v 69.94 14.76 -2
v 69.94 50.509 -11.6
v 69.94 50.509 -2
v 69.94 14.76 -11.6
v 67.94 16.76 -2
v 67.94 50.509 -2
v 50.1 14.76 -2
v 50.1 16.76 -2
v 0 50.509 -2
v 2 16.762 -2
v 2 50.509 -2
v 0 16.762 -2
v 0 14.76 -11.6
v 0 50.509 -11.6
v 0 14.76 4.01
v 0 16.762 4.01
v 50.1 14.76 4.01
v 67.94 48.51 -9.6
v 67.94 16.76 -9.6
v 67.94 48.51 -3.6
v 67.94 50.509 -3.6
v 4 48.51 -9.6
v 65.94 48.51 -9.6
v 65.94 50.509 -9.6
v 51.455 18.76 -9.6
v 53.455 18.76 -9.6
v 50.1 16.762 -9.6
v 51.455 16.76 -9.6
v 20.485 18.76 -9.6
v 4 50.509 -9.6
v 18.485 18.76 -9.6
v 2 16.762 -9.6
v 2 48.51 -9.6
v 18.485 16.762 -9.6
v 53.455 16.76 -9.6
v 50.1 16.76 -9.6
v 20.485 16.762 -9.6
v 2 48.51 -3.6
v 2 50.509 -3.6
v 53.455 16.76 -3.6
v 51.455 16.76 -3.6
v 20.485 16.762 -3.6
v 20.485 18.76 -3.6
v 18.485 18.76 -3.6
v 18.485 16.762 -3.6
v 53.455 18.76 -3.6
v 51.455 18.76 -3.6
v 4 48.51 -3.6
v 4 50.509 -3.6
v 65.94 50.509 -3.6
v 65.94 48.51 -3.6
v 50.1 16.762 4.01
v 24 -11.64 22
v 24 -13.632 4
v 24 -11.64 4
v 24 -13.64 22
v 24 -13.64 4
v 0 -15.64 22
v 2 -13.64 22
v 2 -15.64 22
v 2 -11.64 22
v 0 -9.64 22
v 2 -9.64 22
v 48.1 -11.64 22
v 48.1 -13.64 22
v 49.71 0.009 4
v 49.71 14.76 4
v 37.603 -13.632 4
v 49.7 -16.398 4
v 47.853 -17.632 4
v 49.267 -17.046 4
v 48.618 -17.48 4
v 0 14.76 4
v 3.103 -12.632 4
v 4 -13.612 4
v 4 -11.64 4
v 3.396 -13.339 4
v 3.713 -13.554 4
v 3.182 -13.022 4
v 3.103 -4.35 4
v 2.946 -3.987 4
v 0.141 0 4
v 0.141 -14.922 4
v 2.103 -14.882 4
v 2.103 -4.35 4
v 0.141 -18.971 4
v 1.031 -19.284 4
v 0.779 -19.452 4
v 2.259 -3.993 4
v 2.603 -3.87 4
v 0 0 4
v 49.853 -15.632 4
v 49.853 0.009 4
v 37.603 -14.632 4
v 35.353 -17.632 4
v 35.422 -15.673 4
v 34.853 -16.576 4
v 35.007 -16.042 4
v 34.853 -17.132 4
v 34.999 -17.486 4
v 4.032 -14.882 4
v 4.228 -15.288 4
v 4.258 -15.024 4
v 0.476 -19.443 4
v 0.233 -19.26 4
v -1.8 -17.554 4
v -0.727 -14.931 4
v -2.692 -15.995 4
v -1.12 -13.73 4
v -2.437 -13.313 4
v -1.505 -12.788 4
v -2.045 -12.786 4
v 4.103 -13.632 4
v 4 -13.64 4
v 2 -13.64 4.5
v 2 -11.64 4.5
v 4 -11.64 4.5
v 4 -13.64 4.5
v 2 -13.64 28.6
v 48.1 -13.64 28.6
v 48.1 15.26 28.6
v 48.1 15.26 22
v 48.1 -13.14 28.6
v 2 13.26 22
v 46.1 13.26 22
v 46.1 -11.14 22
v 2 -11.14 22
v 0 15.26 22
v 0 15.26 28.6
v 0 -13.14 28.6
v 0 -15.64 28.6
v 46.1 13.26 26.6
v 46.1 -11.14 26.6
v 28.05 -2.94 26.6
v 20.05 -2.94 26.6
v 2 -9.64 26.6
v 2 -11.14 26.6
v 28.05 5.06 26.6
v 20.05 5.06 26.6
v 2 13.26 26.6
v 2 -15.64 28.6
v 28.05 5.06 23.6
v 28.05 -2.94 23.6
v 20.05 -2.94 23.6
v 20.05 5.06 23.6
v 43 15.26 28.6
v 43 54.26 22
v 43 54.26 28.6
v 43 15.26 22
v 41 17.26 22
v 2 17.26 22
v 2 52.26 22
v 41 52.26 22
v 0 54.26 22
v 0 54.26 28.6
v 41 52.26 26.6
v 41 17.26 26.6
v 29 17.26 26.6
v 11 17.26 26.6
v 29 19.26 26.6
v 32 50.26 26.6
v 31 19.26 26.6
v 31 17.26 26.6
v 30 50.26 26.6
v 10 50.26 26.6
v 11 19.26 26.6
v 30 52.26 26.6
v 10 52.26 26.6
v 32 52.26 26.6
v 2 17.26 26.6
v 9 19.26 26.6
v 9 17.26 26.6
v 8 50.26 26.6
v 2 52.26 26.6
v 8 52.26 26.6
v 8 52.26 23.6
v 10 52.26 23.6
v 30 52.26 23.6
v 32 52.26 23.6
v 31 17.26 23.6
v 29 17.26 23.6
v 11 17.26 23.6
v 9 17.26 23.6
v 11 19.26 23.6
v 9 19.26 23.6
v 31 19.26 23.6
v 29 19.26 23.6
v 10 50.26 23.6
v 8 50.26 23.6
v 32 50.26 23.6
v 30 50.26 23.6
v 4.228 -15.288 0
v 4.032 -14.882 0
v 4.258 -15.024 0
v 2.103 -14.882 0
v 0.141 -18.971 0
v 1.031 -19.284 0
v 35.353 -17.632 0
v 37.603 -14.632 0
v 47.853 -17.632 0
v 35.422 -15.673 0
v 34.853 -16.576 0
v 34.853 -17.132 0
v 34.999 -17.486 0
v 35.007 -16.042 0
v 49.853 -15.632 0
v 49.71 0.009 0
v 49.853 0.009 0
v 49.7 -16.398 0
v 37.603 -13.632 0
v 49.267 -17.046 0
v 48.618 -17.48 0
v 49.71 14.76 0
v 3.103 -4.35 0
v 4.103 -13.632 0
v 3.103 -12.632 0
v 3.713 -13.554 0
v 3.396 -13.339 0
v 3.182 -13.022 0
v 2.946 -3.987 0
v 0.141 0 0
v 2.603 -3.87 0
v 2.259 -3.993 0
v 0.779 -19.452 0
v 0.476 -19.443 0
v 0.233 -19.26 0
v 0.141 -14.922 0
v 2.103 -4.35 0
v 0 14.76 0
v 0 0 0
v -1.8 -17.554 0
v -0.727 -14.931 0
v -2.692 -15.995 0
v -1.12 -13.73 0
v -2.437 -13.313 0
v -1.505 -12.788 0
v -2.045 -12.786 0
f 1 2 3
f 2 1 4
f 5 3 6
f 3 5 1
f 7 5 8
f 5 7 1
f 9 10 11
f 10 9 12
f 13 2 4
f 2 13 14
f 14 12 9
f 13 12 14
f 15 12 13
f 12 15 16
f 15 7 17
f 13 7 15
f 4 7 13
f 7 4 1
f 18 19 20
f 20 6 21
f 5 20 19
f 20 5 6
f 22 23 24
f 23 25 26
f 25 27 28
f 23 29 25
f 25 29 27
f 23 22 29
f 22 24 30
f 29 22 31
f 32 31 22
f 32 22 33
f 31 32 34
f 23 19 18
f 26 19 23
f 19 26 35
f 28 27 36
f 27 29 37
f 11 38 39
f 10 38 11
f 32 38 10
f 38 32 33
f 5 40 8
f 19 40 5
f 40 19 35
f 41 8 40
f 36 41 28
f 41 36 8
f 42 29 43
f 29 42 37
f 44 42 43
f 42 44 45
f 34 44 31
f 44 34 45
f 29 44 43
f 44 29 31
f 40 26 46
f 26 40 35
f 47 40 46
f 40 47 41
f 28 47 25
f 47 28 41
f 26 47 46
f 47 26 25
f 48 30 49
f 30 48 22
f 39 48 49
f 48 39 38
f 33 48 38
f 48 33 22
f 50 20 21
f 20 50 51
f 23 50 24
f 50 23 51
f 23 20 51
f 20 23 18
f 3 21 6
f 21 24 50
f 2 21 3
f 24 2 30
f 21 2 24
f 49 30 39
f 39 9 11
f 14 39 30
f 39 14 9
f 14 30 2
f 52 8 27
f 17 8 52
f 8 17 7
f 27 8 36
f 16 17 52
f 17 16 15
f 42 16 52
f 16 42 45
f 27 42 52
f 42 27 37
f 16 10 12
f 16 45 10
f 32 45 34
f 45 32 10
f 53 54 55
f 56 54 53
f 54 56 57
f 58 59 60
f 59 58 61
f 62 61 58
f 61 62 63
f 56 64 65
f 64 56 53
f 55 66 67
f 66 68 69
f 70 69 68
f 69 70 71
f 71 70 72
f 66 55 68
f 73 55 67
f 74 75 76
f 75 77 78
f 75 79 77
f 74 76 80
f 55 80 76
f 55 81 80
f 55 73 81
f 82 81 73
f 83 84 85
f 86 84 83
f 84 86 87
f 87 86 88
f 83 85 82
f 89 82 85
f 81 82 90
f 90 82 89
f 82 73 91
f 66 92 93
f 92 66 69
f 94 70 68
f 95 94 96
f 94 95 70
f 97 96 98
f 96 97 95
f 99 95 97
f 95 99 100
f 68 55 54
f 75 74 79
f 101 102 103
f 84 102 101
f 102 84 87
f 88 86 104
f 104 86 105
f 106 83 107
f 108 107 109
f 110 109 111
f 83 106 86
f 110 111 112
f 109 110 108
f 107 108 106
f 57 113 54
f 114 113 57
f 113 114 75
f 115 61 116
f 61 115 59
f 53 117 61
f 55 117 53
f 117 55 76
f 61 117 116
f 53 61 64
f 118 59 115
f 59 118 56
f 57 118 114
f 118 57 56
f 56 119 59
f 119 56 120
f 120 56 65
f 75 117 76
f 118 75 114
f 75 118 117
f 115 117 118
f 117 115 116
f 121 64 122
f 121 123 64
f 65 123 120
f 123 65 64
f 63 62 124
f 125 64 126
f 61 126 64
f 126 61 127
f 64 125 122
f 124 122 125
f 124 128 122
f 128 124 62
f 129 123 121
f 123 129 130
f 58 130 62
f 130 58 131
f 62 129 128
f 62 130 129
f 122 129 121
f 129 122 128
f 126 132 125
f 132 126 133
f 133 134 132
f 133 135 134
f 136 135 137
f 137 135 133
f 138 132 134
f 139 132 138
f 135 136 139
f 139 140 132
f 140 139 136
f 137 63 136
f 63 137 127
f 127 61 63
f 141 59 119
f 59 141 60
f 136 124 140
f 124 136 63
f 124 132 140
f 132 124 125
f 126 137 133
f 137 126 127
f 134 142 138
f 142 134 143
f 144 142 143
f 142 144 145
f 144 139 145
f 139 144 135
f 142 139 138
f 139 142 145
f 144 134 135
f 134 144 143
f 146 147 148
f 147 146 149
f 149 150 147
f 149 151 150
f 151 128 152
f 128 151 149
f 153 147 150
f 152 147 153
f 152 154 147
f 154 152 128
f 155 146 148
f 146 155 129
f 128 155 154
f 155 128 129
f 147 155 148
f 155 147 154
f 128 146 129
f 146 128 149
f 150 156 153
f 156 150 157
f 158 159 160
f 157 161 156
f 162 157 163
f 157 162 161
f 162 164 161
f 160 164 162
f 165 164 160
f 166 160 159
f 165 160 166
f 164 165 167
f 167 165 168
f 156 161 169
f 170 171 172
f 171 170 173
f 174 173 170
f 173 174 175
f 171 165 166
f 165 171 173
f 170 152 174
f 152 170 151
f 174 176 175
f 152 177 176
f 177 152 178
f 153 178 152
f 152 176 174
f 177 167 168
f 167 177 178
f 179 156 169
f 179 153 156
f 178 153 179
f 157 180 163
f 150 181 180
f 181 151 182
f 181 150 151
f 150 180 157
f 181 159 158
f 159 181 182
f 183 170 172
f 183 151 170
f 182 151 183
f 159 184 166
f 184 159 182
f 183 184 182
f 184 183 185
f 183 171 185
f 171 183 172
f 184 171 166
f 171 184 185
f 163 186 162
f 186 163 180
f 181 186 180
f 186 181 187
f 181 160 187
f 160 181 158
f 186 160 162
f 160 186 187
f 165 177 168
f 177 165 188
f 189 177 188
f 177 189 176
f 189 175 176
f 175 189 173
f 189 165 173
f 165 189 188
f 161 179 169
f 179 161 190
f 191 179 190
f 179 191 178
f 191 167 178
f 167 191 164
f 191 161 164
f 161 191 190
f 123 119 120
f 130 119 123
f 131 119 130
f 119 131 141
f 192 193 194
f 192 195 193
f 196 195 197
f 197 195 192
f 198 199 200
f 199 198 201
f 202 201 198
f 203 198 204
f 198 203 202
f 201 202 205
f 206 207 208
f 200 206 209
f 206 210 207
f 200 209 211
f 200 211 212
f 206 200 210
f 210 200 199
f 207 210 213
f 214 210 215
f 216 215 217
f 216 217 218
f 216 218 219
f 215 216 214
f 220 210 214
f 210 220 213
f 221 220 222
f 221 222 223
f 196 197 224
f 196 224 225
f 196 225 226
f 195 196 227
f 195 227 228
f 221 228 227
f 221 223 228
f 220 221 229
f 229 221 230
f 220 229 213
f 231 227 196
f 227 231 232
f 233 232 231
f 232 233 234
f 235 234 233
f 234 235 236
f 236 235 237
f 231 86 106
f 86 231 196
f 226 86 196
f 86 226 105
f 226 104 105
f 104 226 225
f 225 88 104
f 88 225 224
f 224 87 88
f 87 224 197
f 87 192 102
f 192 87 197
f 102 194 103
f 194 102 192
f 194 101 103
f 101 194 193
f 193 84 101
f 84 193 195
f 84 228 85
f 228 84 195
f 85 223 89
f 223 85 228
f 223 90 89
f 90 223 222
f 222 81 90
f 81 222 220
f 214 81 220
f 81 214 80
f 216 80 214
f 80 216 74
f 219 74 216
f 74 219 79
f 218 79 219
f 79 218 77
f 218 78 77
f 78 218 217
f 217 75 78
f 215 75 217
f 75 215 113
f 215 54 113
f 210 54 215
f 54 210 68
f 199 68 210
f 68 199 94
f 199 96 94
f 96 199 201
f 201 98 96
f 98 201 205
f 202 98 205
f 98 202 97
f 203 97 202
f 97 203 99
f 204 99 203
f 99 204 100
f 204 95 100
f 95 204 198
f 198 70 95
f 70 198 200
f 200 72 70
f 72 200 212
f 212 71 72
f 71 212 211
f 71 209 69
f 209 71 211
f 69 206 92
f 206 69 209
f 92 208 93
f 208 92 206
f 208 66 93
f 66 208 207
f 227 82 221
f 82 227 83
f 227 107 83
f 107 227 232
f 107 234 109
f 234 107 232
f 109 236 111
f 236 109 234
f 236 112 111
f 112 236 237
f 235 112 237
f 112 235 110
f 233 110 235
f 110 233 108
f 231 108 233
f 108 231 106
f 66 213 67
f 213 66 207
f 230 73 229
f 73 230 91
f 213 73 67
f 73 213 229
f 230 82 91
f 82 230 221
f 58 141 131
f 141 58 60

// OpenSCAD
// file: pcb-model-sizes.scad
pcbSmtLvSize=[65.94, 33.75];
pcbDevkitcRelaySize=[57.53, 31.88];
pcbCurrentSensorSize=[43.5, 35];
pcbCurrentSensorMiniSize=[39, 35];
pcbCurrentSensorMiniPadDepth=15;
pcbContactorPsuSize=[44.1, 24.4];
pcbContactorInterfaceRelaySize=[41.3,34.8];

pcbRelayHeight = 18.5;
pcbTallCompoent = 15;
pcbShortComponent = 6;

pcbThickness = 1.6;
solderThickness = 3;
wallThickness = 1.5;
partitionThickness = 0.8;

caseMargin = 0.2;
// file: bento-pcb-containers.scad
include <pcb-model-sizes.scad>

relayTopStands=[9, 42];
relayBottomStands = [12, 41];

module bentoRelay(wallThickness=[2,2,2], solderThickness=3, boardThickness=1.6, standSize = 2) {
    difference() {
        cube([wallThickness[0] * 2 + pcbDevkitcRelaySize[0], wallThickness[1] * 2 + pcbDevkitcRelaySize[1], wallThickness[2] + solderThickness + boardThickness]);
        translate([wallThickness[0], wallThickness[1], wallThickness[2]]) {
            cube([pcbDevkitcRelaySize[0], pcbDevkitcRelaySize[1], solderThickness + boardThickness + 0.01]);
        }
    }
    translate(wallThickness) {
        for(stand = relayBottomStands) {
            translate([stand, 0, 0]){
               cube([standSize, standSize, solderThickness]);
            }
        }
    }
    translate(wallThickness + [0, pcbDevkitcRelaySize[1] - standSize, 0]) {
        for(stand = relayTopStands) {
            translate([stand, 0, 0]){
               cube([standSize, standSize, solderThickness]);
            }
        }
    }
}

bentoRelay();


currentTopStands=[6, 28];
currentBottomStands = [7, 27];

module bentoCurrentSensor(wallThickness=[2,2,2], solderThickness=3, boardThickness=1.6, standSize = 2) {
    difference() {
        cube([wallThickness[0] * 2 + pcbCurrentSensorSize[0], wallThickness[1] * 2 + pcbCurrentSensorSize[1], wallThickness[2] + solderThickness + boardThickness]);
        translate([wallThickness[0], wallThickness[1], wallThickness[2]]) {
            cube([pcbCurrentSensorSize[0], pcbCurrentSensorSize[1], solderThickness + boardThickness + 0.01]);
        }
    }
    translate(wallThickness) {
        for(stand = currentBottomStands) {
            translate([stand, 0, 0]){
               cube([standSize, standSize, solderThickness]);
            }
        }
    }
    translate(wallThickness + [0, pcbCurrentSensorSize[1] - standSize, 0]) {
        for(stand = currentTopStands) {
            translate([stand, 0, 0]){
               cube([standSize, standSize, solderThickness]);
            }
        }
    }
}

translate([80, 0, 0]) {
    bentoCurrentSensor();
}


smtLvTopStands=[0, pcbSmtLvSize[0] - 2 ];
smtLvBottomStands=[pcbSmtLvSize[0]/4, pcbSmtLvSize[0] - pcbSmtLvSize[0]/4 ];

module bentoSmtLv(wallThickness=[2,2,2], solderThickness=3, boardThickness=1.6, standSize = 2, topWall=true) {
    difference() {
        cube([wallThickness[0] * (topWall ? 2 : 1) + pcbSmtLvSize[0], wallThickness[1] * 2 + pcbSmtLvSize[1], wallThickness[2] + solderThickness + boardThickness]);
        translate([wallThickness[0], wallThickness[1], wallThickness[2]]) {
            cube([pcbSmtLvSize[0], pcbSmtLvSize[1], solderThickness + boardThickness + 0.01]);
        }
    }
    translate(wallThickness) {
        for(stand = smtLvBottomStands) {
            translate([stand, 0, 0]){
               cube([standSize, standSize, solderThickness]);
            }
        }
    }
    translate(wallThickness + [0, pcbSmtLvSize[1] - standSize, 0]) {
        for(stand = smtLvTopStands) {
            translate([stand, 0, 0]){
               cube([standSize, standSize, solderThickness]);
            }
        }
    }
}

translate([140, 0, 0]) {
    bentoSmtLv();
}


echo(pcbContactorPsuSize[0]);

module bentoContactorPsu(wallThickness=[2,2,2], solderThickness=3, boardThickness=1.6, standSize = 2) {
    difference() {
        cube([wallThickness[0] * 2 + pcbContactorPsuSize[0], wallThickness[1] * 2 + pcbContactorPsuSize[1], wallThickness[2] + solderThickness + boardThickness]);
        translate([wallThickness[0], wallThickness[1], wallThickness[2]]) {
            cube([pcbContactorPsuSize[0], pcbContactorPsuSize[1], solderThickness + boardThickness + 0.01]);
        }
    }

    translate([wallThickness[0] + pcbContactorPsuSize[0] / 2 - 2 * standSize, wallThickness[1] + pcbContactorPsuSize[1] / 2 - 2 * standSize, wallThickness[2]]) {
        cube([4 * standSize, 4 * standSize, solderThickness]);
    }
}

translate([220, 0, 0]) {
    bentoContactorPsu();
}

currentMiniTopStands=[6, 28];
currentMiniBottomStands = [7, 27];

module bentoCurrentSensorMini(wallThickness=[2,2,2], solderThickness=3, boardThickness=1.6, standSize = 2) {
    difference() {
        cube([wallThickness[0] * 2 + pcbCurrentSensorMiniSize[0], wallThickness[1] * 2 + pcbCurrentSensorMiniSize[1], wallThickness[2] + solderThickness + boardThickness]);
        translate([wallThickness[0], wallThickness[1], wallThickness[2]]) {
            cube([pcbCurrentSensorMiniSize[0], pcbCurrentSensorMiniSize[1], solderThickness + boardThickness + 0.01]);
        }
    }
    translate(wallThickness) {
        for(stand = currentBottomStands) {
            translate([stand, 0, 0]){
               cube([standSize, standSize, solderThickness]);
            }
        }
    }
    translate(wallThickness + [0, pcbCurrentSensorMiniSize[1] - standSize, 0]) {
        for(stand = currentTopStands) {
            translate([stand, 0, 0]){
               cube([standSize, standSize, solderThickness]);
            }
        }
    }
}

translate([280, 0, 0]) {
    bentoCurrentSensorMini();
}
// main file
use <bento-pcb-containers.scad>
include <pcb-model-sizes.scad>

wallThickness = [2, 2, 2];
dinWidth = 2 * wallThickness[2];

dinMountToRailTop = 13.64;
dinRailWidth = 22;
dinRailFullWidth = 49.71;
psuHeightClearance = 18;
latchWall=2;
pcbClearance = 0.5;
mainBoardOverhang = 2;

module dinClip() {
	translate([-.15,0,0])linear_extrude(height=dinWidth, convexity=5) {
		import(file="../pcb/din_clip_01a.dxf", layer="0", $fn=64);
	}
}

rotate([0, 0, -90]) {
    dinClip();
}


cube([dinRailFullWidth, pcbContactorPsuSize[1] - dinMountToRailTop + 2 * wallThickness[1], dinWidth]);

translate([0, pcbContactorPsuSize[1] - dinMountToRailTop + 2 * wallThickness[1], -wallThickness[0] - solderThickness - 3 - pcbThickness - mainBoardOverhang]) {
    cube([pcbContactorPsuSize[0] + 3 * wallThickness[0], wallThickness[1] + 0.002, wallThickness[2] + solderThickness + 3 + pcbThickness + 0.01 + mainBoardOverhang + dinWidth]);
    difference() {
        bentoSmtLv(solderThickness = solderThickness + 3);
        translate([0, 1 * wallThickness[1] + pcbSmtLvSize[1] - 0.001, 0]) {
            cube([2 * wallThickness[0] + pcbSmtLvSize[0],wallThickness[1] + 0.002, wallThickness[2] + solderThickness + 3 + pcbThickness + 0.01]);
        }
    }
}

translate([latchWall, -dinMountToRailTop,dinWidth]) {
    difference() {
        cube([dinRailWidth,wallThickness[1], psuHeightClearance]); 
        cube([wallThickness[0],wallThickness[1], wallThickness[0] / 4]);
    }
}

translate([0 * latchWall,-dinMountToRailTop,dinWidth + psuHeightClearance]) {
    translate([0,0,0]) {
        cube([pcbContactorPsuSize[0] + 2* wallThickness[0], wallThickness[0], wallThickness[2] + solderThickness + pcbThickness]);
    }
    translate([0,pcbClearance,wallThickness[2] + solderThickness + pcbThickness]) {
        rotate([0,0, 0]) {
            mirror([0,0,1]) {
                bentoContactorPsu();
            }
        }
        
        translate([0, 2 * wallThickness[1] + pcbContactorPsuSize[1], 0]) {
            rotate([0,0, 0]) {
                mirror([0,0,1]) {
                    bentoCurrentSensorMini();
                }
            }
        }

    }
}

translate([0,-dinMountToRailTop - latchWall, dinWidth + psuHeightClearance]) {
    cube([latchWall,latchWall + 2 * wallThickness[1], wallThickness[2] + solderThickness + pcbThickness]);
}
